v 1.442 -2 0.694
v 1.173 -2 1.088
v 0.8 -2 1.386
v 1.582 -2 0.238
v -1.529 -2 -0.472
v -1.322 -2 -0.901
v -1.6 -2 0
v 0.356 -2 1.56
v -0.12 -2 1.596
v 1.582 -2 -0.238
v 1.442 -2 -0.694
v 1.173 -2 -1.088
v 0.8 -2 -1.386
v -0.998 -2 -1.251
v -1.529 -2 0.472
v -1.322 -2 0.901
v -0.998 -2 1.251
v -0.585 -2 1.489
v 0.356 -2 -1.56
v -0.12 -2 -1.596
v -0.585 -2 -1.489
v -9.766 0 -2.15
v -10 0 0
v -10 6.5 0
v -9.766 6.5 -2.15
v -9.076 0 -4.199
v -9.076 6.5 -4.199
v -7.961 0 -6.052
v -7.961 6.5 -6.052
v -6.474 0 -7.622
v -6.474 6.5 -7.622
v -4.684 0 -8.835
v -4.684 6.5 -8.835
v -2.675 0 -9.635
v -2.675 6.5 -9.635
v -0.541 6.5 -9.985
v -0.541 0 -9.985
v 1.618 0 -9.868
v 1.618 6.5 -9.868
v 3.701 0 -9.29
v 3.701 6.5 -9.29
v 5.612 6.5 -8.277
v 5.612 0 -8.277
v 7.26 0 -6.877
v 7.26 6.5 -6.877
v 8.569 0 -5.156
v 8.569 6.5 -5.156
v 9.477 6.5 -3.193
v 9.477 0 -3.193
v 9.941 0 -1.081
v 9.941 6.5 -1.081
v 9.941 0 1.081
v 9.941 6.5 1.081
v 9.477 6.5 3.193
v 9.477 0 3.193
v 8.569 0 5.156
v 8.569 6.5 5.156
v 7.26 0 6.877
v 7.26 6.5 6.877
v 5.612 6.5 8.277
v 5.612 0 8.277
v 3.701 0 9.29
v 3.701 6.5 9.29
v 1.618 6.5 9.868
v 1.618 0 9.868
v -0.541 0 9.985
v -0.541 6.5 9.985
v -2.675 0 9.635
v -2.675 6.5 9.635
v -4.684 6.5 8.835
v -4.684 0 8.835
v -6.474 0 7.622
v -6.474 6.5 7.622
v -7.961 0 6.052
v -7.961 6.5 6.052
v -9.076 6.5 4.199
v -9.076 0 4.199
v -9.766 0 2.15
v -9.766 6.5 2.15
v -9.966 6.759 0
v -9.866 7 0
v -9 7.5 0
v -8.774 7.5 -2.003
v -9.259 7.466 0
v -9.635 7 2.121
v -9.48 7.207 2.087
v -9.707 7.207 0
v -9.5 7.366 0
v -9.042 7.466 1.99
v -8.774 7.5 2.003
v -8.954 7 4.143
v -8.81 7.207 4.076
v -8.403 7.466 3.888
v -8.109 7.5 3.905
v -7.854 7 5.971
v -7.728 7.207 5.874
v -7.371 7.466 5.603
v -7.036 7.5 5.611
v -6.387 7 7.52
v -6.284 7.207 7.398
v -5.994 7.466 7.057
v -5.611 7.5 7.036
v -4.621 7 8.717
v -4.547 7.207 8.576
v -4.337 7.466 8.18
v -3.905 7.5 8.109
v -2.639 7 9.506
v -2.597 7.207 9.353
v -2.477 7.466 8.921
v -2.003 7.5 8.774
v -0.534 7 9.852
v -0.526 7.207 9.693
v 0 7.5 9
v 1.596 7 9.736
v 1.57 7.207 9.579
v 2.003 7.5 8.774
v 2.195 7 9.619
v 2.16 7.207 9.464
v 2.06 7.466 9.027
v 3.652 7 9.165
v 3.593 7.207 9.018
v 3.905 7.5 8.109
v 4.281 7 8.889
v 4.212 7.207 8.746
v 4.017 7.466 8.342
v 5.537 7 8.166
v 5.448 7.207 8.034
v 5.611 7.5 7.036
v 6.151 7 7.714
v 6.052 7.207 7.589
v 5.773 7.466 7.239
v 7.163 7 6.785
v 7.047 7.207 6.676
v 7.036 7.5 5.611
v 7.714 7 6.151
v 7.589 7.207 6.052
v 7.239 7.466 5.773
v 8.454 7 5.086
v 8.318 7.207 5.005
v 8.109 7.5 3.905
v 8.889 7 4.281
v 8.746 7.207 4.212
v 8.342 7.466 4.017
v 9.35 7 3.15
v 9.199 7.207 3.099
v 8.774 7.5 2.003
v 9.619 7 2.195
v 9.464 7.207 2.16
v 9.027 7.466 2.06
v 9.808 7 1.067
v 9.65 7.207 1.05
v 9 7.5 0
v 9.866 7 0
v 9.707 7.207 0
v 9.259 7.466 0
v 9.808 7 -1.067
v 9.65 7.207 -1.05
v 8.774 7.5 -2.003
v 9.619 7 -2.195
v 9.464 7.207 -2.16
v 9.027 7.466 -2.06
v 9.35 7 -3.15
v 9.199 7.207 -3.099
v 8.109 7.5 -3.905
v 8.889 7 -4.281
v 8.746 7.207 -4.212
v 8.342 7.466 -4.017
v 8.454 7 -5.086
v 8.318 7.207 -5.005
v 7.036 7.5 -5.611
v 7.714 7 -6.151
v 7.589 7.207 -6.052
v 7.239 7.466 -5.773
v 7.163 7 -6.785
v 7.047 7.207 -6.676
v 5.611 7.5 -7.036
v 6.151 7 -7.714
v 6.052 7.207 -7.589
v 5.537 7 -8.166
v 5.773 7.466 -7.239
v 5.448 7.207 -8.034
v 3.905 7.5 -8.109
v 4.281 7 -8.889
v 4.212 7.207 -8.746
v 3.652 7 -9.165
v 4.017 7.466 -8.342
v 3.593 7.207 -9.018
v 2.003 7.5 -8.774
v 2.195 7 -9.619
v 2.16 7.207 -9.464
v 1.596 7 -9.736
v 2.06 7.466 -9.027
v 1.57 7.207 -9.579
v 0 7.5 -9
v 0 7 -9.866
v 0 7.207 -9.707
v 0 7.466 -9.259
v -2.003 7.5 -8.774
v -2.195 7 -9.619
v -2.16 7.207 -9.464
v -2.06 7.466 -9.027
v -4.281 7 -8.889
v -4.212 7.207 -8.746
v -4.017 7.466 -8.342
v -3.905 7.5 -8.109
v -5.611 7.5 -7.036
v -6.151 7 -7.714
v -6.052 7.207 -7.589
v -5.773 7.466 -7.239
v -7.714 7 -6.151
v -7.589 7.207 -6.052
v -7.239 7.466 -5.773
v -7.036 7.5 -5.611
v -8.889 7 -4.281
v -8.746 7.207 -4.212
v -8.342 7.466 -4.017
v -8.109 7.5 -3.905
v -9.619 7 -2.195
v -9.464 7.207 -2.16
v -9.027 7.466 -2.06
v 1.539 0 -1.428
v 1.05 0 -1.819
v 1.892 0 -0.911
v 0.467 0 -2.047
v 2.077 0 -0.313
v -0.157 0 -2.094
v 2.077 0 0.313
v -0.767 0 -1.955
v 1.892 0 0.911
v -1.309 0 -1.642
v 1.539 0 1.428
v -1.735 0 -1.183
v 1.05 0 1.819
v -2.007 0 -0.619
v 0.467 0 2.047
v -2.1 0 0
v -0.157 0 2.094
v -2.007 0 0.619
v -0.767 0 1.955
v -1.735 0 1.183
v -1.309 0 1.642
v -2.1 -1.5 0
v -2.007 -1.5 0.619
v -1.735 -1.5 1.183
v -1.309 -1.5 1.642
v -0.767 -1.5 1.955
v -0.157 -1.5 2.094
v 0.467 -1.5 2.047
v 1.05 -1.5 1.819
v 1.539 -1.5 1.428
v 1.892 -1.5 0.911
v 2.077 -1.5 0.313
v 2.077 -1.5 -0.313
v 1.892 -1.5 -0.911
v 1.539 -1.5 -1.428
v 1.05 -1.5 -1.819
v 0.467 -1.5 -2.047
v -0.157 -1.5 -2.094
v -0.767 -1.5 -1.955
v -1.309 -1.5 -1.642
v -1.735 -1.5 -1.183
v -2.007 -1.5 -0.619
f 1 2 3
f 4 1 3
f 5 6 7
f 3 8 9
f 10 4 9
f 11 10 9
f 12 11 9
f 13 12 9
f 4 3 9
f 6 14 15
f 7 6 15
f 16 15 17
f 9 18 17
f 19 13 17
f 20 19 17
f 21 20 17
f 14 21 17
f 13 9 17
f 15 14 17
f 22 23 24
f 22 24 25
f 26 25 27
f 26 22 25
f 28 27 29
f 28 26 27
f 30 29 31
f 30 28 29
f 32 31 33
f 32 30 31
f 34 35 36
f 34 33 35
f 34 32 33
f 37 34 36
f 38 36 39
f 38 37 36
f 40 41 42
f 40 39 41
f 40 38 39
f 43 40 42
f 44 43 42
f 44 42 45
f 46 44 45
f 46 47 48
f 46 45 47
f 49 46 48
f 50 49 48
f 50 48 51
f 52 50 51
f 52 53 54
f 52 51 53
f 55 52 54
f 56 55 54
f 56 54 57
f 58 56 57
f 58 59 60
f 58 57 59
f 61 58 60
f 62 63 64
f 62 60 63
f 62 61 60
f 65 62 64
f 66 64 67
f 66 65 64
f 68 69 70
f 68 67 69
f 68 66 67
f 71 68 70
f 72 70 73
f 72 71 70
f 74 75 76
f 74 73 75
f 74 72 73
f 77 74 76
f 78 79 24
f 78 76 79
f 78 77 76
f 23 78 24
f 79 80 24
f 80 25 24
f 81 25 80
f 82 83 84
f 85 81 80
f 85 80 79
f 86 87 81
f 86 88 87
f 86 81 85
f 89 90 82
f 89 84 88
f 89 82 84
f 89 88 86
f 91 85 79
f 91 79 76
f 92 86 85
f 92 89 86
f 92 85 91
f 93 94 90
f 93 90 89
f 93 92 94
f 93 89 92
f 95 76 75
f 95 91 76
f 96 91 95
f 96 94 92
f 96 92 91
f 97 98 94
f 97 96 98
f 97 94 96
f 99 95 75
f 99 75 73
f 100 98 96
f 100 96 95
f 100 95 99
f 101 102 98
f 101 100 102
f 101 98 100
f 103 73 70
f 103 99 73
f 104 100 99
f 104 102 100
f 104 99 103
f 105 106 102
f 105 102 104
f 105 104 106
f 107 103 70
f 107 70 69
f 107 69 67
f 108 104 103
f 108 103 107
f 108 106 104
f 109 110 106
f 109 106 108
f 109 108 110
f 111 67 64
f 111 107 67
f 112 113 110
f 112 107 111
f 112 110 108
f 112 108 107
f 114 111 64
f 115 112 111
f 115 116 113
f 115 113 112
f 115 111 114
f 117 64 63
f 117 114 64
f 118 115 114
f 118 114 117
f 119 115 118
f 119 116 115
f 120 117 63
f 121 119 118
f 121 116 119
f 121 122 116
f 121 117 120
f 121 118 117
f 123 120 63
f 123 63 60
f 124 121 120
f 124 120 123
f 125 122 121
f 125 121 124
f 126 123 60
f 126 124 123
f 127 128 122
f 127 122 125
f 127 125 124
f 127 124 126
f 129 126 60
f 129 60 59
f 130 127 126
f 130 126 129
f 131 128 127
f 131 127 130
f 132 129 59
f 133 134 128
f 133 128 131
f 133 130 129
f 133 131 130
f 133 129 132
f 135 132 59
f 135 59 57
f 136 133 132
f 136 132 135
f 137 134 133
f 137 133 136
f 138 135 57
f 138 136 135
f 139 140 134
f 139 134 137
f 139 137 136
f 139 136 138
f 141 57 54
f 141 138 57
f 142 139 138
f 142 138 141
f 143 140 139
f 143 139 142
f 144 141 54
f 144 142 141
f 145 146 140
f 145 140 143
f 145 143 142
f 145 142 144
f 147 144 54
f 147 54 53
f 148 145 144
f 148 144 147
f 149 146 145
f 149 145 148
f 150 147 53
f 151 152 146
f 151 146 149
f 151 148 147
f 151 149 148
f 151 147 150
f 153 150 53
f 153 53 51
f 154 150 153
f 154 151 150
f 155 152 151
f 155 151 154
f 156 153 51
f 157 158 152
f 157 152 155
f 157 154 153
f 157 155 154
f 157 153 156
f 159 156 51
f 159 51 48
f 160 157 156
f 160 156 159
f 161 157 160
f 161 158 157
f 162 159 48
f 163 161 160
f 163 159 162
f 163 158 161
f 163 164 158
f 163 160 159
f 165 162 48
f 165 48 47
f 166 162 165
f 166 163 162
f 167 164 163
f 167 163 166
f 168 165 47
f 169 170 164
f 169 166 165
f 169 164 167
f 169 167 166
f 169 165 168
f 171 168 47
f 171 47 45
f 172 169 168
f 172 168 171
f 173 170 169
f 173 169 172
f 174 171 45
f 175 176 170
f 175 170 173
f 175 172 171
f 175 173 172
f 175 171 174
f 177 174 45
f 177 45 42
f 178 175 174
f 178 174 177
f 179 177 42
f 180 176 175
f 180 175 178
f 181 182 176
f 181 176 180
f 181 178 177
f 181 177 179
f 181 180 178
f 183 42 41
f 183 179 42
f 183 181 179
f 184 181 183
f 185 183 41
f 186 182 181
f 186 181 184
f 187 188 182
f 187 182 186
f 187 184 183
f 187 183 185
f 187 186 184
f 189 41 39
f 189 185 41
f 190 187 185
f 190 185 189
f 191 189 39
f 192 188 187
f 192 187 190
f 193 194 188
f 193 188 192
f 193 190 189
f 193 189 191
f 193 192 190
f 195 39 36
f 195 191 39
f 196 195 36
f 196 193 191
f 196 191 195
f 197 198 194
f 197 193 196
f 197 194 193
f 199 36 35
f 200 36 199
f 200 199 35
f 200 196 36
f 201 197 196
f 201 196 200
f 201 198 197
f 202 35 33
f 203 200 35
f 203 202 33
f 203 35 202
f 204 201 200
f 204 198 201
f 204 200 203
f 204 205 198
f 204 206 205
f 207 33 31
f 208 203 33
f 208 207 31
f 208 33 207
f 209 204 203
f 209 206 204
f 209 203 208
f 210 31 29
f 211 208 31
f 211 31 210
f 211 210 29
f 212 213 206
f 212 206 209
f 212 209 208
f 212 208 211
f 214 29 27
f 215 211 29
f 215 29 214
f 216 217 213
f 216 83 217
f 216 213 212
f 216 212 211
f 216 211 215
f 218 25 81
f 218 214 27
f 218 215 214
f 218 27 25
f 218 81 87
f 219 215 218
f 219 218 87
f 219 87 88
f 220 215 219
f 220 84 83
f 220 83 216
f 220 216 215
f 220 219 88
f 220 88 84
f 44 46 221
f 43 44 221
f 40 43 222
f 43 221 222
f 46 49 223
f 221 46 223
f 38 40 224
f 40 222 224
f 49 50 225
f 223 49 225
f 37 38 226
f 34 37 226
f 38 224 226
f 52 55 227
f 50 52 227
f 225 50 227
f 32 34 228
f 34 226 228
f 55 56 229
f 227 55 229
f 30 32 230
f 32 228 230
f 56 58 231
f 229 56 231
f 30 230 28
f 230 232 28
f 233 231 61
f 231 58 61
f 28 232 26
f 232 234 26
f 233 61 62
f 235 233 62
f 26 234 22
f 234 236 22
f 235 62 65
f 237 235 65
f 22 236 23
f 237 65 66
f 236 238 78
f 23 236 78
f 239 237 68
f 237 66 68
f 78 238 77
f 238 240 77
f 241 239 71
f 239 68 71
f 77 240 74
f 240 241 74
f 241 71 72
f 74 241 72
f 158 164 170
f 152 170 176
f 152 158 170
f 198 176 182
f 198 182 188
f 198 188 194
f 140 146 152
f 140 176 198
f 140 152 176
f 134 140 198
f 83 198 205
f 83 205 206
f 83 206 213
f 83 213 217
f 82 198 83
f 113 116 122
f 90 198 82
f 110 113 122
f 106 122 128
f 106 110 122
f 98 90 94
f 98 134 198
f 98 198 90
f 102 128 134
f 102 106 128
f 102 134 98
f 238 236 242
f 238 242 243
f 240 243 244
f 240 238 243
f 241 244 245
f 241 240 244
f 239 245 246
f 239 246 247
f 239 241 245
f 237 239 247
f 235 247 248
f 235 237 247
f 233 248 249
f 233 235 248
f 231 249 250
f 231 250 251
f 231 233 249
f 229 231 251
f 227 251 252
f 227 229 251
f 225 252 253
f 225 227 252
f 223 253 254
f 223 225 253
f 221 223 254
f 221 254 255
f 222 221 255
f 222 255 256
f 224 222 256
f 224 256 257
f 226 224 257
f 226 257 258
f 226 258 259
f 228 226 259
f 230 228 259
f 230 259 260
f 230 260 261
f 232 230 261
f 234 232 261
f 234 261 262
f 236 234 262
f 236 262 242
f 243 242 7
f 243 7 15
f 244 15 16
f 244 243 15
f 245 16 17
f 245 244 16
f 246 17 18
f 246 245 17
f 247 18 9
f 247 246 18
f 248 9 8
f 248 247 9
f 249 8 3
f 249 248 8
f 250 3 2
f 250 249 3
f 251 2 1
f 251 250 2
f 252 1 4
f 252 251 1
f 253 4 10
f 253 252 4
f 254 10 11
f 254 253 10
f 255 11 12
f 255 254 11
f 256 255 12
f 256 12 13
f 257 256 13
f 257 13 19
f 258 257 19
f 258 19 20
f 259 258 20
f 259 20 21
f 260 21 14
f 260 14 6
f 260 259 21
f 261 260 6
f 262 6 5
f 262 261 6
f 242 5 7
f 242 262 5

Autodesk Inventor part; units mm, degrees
ref_plane "YZ Plane" through (0, 0, 0) normal (1, 0, 0) x (0, 1, 0)
ref_plane "XZ Plane" through (0, 0, 0) normal (0, 1, 0) x (-1, 0, 0)
ref_plane "XY Plane" through (0, 0, 0) normal (0, 0, 1) x (1, 0, 0)
sketch "Sketch1" plane through (0, 0, 0) normal (0, 1, 0) x (-1, 0, 0)
  circle A0 centre (0, 0) radius 2.3
  circle A1 centre (0, 0) radius 10
  circle A2 centre (0, 0) radius 2.1
  dimension "d0" = 0.2
extrude "Extrusion1" add sketch "Sketch1" along normal blind 7.5 contours A0 | A1 | A2
fillet "Fillet1" radius 1 1 edges at (10, 7.5, 0)
extrude "Extrusion2" add sketch "Sketch1" against normal blind 2 contours A2
chamfer "Chamfer1" distance 0.5 angle 45 1 edges at (2.1, -2, 0)
properties part number "knob_top"
